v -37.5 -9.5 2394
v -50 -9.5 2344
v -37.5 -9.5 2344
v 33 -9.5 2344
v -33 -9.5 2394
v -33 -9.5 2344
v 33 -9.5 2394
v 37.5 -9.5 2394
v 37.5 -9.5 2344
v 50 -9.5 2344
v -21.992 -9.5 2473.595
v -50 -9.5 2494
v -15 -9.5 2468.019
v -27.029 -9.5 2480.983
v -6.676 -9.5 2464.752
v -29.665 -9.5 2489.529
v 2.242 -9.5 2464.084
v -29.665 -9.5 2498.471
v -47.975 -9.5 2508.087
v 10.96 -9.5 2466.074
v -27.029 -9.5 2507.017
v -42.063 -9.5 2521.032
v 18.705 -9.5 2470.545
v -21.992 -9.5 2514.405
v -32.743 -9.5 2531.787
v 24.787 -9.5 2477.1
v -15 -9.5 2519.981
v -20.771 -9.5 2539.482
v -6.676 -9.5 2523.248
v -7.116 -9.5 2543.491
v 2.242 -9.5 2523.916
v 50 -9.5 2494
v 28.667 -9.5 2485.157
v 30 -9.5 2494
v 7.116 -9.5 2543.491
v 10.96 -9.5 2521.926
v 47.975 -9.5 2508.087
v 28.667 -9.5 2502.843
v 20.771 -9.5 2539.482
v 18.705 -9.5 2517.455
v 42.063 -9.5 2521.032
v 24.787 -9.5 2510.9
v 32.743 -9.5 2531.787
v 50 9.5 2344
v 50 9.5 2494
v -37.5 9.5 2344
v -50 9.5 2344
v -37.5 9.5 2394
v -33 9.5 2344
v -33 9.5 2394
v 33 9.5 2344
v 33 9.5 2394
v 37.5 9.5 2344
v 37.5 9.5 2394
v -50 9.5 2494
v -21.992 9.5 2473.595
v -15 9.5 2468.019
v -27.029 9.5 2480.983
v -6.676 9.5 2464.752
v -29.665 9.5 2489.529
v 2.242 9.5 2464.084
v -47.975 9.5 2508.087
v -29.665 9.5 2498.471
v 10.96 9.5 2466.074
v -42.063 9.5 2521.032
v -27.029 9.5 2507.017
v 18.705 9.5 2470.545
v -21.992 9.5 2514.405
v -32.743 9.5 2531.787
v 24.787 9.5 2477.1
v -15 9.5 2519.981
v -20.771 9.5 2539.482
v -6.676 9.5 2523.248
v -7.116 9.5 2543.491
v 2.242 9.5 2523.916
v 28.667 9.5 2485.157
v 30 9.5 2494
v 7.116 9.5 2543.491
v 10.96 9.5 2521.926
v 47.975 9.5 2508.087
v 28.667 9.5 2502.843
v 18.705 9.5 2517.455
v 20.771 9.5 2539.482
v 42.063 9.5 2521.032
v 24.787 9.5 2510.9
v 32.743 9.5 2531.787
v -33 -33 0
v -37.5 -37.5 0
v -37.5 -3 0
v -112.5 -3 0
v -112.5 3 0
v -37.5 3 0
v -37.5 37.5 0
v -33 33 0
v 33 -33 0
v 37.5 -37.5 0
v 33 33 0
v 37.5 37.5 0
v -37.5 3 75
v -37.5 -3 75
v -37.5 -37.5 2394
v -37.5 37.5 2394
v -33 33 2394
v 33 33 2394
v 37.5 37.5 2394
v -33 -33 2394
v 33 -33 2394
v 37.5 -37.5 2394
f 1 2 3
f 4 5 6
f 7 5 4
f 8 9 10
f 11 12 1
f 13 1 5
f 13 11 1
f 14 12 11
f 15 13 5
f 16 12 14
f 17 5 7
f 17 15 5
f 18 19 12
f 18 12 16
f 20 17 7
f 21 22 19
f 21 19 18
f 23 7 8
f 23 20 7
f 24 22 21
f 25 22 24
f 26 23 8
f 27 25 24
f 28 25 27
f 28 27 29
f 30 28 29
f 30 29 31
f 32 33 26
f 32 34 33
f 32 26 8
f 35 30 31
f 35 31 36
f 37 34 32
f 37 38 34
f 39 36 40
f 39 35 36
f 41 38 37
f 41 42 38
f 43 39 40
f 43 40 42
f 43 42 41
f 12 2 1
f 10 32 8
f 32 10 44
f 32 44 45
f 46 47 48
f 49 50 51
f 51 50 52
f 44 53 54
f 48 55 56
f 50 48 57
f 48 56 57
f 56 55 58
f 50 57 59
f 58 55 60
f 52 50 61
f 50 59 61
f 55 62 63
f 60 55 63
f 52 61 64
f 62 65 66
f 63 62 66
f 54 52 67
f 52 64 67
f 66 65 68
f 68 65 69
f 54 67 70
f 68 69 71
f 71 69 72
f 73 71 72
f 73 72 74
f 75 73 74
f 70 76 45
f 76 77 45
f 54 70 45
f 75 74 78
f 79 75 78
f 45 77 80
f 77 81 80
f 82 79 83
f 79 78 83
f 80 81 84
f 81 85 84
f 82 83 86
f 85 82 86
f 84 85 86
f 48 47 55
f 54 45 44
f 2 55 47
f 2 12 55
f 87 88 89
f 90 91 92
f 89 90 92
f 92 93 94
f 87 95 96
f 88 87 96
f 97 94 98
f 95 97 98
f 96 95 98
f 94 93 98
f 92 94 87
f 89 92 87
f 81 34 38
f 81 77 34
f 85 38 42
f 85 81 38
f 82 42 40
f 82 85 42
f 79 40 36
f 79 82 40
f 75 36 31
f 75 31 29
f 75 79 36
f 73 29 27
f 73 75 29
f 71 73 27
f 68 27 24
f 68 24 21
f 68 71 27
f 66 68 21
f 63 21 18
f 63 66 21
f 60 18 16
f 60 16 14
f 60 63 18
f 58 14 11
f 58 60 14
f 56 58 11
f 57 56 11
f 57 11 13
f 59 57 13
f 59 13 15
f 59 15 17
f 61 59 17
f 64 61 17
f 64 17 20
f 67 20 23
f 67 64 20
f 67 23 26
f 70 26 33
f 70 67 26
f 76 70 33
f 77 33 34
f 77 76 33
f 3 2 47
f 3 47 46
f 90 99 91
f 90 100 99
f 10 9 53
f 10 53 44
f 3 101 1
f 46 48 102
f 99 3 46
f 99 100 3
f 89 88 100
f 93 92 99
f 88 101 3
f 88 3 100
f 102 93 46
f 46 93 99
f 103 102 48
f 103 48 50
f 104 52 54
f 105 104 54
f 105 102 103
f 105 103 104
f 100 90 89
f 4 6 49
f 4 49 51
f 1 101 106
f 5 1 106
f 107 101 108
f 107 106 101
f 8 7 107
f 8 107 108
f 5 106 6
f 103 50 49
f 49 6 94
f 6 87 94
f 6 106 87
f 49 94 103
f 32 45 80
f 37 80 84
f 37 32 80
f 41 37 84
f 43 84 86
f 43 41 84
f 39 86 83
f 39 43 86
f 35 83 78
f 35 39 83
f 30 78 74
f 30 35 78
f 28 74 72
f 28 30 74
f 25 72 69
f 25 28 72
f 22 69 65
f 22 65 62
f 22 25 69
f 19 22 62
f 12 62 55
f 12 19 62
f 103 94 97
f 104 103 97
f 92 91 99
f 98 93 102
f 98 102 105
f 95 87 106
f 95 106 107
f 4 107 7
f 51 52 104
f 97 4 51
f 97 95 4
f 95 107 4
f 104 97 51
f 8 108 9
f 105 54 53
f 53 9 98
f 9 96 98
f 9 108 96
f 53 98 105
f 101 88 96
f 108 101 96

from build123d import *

# Parameters (mm, degrees)
F0_W     = 75
F0_H     = 75
F0_W_2   = 66
F0_H_2   = 66
F1_DEPTH = 2394
F2_R     = 30
F3_DEPTH = 9.5
F5_DEPTH = 3


with BuildPart() as f1:
    # F0 (on Top) → F1 (new body)
    with BuildSketch(Plane.XY):
        Rectangle(F0_W, F0_H)
        Rectangle(F0_W_2, F0_H_2, mode=Mode.SUBTRACT)
    extrude(amount=F1_DEPTH)

    # F2 (on Front) → F3 (join, symmetric)
    with BuildSketch(Plane.XZ):
        with BuildLine():
            Line((-50, 2494), (-50, 2344))
            Line((-50, 2344), (50, 2344))
            Line((50, 2344), (50, 2494))
            ThreePointArc((50, 2494), (0, 2544), (-50, 2494))
        make_face()
        with Locations((0, 2494)):
            Circle(F2_R, mode=Mode.SUBTRACT)
    extrude(amount=F3_DEPTH, both=True)

    # F4 (on Front) → F5 (join, symmetric)
    with BuildSketch(Plane.XZ):
        Polygon((-112.5, 0), (-37.5, 0), (-37.5, 75), align=None)
    extrude(amount=F5_DEPTH, both=True)


solid = f1.part
